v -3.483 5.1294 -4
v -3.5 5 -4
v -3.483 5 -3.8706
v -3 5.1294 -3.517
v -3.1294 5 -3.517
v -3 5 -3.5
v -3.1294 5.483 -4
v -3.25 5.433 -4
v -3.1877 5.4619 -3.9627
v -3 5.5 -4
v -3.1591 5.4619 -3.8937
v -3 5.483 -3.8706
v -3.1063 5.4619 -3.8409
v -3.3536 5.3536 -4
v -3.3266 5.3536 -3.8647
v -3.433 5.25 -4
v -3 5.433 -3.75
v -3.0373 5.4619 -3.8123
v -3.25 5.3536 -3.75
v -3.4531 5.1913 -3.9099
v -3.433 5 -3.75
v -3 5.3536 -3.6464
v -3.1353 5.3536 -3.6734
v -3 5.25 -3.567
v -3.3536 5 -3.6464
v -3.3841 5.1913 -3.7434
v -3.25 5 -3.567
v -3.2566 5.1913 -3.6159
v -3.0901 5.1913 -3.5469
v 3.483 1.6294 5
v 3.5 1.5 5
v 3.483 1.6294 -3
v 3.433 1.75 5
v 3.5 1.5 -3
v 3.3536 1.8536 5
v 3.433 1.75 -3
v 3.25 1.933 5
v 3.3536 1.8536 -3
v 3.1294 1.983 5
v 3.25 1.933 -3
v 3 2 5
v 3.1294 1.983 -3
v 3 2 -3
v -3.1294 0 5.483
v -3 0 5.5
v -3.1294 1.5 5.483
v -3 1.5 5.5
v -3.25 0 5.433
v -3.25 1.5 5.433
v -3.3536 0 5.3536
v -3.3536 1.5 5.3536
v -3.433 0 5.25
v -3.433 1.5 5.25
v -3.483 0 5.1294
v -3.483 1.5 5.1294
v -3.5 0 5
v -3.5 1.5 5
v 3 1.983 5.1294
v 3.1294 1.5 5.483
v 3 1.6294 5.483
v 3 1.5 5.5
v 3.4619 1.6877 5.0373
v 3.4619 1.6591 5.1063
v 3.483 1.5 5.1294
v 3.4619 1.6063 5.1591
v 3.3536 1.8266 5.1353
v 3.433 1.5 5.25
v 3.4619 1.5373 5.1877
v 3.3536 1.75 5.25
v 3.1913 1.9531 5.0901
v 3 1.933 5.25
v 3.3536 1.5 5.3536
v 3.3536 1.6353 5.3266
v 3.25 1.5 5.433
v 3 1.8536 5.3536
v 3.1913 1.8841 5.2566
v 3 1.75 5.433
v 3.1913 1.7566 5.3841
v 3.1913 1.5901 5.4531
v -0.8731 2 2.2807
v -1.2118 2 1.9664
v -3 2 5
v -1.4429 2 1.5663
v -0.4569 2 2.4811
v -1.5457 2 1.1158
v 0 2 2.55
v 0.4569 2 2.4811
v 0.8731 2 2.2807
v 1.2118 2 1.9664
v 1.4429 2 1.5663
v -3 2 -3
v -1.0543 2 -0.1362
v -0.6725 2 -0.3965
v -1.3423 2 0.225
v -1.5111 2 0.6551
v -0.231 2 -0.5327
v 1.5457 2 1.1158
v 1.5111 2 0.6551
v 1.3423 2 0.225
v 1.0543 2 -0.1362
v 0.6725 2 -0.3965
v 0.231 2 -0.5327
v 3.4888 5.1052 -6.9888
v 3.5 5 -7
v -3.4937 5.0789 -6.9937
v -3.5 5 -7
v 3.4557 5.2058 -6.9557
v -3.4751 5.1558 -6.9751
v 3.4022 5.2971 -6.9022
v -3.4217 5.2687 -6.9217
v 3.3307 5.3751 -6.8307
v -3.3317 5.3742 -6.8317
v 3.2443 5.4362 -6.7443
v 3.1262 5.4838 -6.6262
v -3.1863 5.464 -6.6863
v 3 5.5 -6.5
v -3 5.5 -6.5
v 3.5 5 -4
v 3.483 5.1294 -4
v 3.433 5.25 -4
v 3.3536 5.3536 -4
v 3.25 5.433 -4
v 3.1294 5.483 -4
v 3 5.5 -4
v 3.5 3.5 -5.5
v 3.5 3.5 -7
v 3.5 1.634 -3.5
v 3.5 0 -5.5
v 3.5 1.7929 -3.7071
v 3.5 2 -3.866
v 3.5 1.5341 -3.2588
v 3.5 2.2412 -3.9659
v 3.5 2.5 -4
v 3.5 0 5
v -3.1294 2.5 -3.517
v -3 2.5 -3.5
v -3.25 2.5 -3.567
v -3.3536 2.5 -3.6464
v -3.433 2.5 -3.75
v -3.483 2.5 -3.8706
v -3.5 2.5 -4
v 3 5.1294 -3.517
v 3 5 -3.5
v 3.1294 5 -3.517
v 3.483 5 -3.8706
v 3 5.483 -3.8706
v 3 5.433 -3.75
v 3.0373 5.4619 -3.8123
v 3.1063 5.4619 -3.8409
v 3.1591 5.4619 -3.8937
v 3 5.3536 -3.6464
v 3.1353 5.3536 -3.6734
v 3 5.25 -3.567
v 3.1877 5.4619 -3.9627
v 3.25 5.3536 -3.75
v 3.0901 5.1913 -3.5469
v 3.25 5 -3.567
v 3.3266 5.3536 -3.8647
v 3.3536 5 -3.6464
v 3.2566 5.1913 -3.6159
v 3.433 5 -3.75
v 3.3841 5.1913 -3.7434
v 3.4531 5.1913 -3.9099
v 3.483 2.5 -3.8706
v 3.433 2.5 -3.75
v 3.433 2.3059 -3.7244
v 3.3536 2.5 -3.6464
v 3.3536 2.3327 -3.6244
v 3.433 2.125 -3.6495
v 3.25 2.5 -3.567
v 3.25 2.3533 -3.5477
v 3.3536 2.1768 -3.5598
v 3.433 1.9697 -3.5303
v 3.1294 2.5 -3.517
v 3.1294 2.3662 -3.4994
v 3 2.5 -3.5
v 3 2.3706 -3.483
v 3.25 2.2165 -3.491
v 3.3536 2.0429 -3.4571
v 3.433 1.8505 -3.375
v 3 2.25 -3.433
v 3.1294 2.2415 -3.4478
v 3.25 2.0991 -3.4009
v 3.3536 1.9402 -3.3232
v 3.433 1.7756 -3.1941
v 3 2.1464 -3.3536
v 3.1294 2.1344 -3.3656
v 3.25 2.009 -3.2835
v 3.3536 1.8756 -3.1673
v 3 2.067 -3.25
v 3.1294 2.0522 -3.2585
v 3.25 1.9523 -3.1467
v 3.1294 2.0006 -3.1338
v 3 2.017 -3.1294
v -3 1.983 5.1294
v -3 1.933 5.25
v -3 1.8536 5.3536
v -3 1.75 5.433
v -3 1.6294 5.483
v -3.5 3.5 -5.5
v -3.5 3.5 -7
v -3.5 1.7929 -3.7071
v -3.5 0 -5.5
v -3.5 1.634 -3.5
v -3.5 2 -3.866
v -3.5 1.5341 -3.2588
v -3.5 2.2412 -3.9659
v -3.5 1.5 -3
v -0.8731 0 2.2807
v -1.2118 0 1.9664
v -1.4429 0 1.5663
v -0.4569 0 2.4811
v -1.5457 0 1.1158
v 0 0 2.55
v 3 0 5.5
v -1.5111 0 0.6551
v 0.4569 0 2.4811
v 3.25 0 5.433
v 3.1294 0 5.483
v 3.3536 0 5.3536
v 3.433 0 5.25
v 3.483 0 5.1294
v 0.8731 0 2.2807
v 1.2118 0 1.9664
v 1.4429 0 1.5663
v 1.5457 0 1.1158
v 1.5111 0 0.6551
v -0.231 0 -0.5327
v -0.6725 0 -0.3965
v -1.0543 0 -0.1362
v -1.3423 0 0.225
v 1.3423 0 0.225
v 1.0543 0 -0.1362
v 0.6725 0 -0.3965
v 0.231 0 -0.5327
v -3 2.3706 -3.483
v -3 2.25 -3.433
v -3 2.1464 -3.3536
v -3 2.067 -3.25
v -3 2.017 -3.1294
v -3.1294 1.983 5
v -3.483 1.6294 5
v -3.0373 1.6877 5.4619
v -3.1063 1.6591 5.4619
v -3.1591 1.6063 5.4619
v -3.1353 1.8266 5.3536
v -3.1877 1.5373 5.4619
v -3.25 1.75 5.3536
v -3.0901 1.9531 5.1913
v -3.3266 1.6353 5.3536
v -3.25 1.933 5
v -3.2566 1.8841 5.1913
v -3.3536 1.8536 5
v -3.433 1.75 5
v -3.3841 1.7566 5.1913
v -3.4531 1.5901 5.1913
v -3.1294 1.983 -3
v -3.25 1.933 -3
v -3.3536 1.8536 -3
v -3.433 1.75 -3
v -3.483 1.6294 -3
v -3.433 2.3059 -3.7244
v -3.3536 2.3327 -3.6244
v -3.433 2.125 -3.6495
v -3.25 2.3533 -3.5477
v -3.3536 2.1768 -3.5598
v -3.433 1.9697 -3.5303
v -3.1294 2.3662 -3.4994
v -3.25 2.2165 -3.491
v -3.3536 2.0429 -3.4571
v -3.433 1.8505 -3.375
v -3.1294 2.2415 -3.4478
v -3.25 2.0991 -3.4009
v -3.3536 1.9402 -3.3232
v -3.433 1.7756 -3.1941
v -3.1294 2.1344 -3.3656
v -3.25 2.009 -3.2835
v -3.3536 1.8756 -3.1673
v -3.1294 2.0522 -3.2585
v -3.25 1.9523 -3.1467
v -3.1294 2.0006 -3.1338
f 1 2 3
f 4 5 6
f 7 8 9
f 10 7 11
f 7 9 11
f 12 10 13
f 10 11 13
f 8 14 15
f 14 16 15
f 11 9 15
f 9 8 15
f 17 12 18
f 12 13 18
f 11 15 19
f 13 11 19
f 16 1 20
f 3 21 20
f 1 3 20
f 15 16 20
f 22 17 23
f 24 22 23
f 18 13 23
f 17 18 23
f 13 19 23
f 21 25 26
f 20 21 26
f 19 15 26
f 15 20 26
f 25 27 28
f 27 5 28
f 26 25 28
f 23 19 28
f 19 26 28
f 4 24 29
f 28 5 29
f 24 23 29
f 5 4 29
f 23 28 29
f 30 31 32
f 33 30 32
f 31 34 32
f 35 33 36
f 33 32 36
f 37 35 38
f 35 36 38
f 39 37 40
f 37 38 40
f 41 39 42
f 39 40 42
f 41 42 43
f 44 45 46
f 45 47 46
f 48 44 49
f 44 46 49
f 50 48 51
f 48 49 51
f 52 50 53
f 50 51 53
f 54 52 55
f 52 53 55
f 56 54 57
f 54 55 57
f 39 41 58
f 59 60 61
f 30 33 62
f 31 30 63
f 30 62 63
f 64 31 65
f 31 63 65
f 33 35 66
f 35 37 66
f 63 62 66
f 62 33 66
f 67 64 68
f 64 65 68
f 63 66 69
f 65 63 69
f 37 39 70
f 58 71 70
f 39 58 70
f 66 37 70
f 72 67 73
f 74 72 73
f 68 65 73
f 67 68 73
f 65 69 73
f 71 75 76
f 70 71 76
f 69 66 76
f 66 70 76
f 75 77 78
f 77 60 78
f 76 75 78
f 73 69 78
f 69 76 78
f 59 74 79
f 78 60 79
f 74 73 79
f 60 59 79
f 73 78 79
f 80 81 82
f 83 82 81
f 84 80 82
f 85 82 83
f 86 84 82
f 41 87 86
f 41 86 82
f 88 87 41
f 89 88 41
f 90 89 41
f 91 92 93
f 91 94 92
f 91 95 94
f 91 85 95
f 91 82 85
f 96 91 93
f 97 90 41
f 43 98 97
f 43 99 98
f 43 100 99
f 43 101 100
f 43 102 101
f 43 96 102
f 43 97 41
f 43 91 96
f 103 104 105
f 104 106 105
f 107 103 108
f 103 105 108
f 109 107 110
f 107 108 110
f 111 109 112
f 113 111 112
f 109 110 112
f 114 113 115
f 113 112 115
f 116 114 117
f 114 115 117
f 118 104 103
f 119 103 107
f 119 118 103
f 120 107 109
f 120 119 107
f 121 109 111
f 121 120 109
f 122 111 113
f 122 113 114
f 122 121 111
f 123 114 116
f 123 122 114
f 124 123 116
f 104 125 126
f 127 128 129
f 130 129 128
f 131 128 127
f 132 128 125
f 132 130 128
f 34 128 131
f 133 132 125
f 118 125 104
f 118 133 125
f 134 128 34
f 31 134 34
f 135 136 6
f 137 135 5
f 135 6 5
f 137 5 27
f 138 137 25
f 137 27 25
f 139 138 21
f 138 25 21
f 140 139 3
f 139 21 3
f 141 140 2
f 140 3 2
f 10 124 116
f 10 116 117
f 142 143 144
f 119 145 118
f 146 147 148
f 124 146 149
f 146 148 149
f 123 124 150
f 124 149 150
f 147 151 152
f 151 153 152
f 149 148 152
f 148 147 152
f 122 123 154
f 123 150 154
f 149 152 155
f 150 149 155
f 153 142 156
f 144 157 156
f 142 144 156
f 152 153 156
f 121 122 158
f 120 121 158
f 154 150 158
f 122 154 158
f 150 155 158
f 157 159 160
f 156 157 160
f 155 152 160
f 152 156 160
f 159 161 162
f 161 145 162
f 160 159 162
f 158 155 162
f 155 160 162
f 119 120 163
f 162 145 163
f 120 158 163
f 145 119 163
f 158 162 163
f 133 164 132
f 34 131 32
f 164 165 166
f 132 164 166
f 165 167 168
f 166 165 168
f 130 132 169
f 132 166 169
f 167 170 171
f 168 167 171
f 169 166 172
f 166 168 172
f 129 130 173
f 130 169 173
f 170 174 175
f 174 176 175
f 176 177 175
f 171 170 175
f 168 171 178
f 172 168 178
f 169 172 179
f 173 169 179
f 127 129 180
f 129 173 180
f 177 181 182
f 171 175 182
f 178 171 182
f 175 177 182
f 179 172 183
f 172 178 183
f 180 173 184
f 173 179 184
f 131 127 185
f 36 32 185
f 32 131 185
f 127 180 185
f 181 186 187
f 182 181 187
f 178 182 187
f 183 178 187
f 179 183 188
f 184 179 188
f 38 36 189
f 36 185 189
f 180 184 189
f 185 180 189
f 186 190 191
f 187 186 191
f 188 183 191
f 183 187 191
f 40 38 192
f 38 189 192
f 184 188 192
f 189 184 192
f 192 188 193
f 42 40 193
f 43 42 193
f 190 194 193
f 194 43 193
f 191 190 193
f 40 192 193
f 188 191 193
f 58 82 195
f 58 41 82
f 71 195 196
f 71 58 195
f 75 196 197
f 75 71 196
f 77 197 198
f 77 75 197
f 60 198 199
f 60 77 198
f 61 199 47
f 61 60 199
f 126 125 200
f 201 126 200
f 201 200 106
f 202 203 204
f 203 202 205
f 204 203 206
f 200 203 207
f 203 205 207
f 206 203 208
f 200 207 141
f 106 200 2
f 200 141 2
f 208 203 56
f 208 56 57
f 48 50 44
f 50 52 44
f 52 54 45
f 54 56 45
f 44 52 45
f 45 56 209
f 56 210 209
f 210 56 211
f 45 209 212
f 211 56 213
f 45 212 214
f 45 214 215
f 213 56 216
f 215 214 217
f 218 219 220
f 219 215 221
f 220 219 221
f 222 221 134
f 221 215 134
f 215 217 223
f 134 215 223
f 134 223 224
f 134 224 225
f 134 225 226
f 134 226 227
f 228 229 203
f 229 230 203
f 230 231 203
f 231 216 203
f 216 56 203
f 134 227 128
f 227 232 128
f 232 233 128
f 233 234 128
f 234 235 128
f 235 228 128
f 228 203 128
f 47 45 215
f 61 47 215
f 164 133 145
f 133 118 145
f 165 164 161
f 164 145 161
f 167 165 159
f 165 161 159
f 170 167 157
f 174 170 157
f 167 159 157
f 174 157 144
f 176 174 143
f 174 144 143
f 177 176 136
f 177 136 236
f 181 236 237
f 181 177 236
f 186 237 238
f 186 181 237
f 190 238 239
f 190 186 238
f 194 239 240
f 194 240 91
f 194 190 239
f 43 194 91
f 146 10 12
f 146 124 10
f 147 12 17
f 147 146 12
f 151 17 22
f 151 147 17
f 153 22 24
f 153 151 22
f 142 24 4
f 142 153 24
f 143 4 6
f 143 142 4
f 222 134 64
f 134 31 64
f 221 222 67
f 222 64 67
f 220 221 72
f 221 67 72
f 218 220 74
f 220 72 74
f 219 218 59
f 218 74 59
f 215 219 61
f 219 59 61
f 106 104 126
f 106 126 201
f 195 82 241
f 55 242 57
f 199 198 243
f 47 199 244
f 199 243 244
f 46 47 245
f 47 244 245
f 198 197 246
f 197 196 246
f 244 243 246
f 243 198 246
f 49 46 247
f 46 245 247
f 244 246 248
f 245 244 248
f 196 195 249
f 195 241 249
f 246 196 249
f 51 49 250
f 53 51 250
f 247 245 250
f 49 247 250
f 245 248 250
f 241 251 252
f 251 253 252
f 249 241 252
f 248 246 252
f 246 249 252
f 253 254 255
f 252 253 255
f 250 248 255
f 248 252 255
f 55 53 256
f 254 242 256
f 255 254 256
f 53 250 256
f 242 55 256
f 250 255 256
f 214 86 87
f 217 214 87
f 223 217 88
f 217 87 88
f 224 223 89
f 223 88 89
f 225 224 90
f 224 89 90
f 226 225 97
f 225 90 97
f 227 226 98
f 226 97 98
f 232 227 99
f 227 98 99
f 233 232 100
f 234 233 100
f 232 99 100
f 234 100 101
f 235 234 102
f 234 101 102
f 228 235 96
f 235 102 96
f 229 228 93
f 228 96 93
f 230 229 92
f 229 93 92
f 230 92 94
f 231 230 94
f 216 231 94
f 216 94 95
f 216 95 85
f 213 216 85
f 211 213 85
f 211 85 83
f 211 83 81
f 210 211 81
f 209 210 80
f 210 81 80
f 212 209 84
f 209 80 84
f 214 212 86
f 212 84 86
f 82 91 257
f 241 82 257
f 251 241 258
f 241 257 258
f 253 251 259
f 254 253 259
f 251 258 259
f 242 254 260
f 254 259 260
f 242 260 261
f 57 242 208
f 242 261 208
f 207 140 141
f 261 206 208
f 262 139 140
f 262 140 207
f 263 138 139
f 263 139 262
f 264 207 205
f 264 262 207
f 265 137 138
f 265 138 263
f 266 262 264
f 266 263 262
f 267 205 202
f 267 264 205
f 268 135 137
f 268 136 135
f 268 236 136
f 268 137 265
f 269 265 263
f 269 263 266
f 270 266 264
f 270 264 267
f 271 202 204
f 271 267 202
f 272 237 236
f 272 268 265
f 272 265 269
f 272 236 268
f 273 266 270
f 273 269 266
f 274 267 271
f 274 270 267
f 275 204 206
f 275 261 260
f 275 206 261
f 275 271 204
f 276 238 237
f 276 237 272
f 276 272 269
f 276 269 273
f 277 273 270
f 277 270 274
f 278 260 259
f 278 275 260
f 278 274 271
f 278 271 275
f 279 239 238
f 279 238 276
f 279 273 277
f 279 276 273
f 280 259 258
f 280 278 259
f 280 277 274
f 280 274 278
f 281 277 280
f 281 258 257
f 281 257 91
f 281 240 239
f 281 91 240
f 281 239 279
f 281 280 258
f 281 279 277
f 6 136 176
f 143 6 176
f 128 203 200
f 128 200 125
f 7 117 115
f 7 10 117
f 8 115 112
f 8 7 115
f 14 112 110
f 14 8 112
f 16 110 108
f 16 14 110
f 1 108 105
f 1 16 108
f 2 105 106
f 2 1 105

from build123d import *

# Parameters (mm, degrees)
ESBO_O1_W                = 7
ESBO_O1_H                = 11
RESSALTO_EXTRUS_O1_DEPTH = 2
ESBO_O2_W                = 7
ESBO_O2_H                = 2
RESSALTO_EXTRUS_O2_DEPTH = 3.5
ESBO_O3_W                = 7
ESBO_O3_H                = 2
RESSALTO_EXTRUS_O3_DEPTH = 1.5
ESBO_O4_R                = 1.55
CORTE_EXTRUS_O1_DEPTH    = 2
FILETE1_R                = 0.5


with BuildPart() as part:
    # Esboço1 → Ressalto-extrusão1 (new body)
    with BuildSketch(Plane(origin=(0, 0, 0), x_dir=(1, 0, 0), z_dir=(0, 1, 0))):
        Rectangle(ESBO_O1_W, ESBO_O1_H)
    extrude(amount=RESSALTO_EXTRUS_O1_DEPTH)

    # Esboço2 → Ressalto-extrusão2 (add)
    with BuildSketch(Plane(origin=(0, 2, 0), x_dir=(1, 0, 0), z_dir=(0, 1, 0))):
        with Locations((0, 4.5)):
            Rectangle(ESBO_O2_W, ESBO_O2_H)
    extrude(amount=RESSALTO_EXTRUS_O2_DEPTH)

    # Esboço3 → Ressalto-extrusão3 (add)
    with BuildSketch(Plane(origin=(0, 0, -5.5), x_dir=(-1, 0, 0), z_dir=(0, 0, -1))):
        with Locations((0, 4.5)):
            Rectangle(ESBO_O3_W, ESBO_O3_H)
    extrude(amount=RESSALTO_EXTRUS_O3_DEPTH)

    # Esboço4 → Corte-extrusão1 (cut)
    with BuildSketch(Plane(origin=(0, 2, 0), x_dir=(1, 0, 0), z_dir=(0, 1, 0))):
        with Locations(Location((0, -1, 0), (0, 0, 270))):
            Circle(ESBO_O4_R)
    extrude(amount=-CORTE_EXTRUS_O1_DEPTH, mode=Mode.SUBTRACT)

    # Filete1
    filete1_edges = [part.edges().sort_by_distance(p)[0] for p in [
        (-3.5, 2, 1),
        (0, 2, -3.5),
        (-3.5, 3.75, -3.5),
        (0, 2, 5.5),
        (3.5, 3.75, -3.5),
        (-3.5, 5.5, -5.25),
        (0, 5.5, -3.5),
        (3.5, 5.5, -5.25),
        (0, 5.5, -7),
        (3.5, 2, 1),
        (3.5, 1, 5.5),
        (-3.5, 1, 5.5),
    ]]
    fillet(filete1_edges, radius=FILETE1_R)


solid = part.part
